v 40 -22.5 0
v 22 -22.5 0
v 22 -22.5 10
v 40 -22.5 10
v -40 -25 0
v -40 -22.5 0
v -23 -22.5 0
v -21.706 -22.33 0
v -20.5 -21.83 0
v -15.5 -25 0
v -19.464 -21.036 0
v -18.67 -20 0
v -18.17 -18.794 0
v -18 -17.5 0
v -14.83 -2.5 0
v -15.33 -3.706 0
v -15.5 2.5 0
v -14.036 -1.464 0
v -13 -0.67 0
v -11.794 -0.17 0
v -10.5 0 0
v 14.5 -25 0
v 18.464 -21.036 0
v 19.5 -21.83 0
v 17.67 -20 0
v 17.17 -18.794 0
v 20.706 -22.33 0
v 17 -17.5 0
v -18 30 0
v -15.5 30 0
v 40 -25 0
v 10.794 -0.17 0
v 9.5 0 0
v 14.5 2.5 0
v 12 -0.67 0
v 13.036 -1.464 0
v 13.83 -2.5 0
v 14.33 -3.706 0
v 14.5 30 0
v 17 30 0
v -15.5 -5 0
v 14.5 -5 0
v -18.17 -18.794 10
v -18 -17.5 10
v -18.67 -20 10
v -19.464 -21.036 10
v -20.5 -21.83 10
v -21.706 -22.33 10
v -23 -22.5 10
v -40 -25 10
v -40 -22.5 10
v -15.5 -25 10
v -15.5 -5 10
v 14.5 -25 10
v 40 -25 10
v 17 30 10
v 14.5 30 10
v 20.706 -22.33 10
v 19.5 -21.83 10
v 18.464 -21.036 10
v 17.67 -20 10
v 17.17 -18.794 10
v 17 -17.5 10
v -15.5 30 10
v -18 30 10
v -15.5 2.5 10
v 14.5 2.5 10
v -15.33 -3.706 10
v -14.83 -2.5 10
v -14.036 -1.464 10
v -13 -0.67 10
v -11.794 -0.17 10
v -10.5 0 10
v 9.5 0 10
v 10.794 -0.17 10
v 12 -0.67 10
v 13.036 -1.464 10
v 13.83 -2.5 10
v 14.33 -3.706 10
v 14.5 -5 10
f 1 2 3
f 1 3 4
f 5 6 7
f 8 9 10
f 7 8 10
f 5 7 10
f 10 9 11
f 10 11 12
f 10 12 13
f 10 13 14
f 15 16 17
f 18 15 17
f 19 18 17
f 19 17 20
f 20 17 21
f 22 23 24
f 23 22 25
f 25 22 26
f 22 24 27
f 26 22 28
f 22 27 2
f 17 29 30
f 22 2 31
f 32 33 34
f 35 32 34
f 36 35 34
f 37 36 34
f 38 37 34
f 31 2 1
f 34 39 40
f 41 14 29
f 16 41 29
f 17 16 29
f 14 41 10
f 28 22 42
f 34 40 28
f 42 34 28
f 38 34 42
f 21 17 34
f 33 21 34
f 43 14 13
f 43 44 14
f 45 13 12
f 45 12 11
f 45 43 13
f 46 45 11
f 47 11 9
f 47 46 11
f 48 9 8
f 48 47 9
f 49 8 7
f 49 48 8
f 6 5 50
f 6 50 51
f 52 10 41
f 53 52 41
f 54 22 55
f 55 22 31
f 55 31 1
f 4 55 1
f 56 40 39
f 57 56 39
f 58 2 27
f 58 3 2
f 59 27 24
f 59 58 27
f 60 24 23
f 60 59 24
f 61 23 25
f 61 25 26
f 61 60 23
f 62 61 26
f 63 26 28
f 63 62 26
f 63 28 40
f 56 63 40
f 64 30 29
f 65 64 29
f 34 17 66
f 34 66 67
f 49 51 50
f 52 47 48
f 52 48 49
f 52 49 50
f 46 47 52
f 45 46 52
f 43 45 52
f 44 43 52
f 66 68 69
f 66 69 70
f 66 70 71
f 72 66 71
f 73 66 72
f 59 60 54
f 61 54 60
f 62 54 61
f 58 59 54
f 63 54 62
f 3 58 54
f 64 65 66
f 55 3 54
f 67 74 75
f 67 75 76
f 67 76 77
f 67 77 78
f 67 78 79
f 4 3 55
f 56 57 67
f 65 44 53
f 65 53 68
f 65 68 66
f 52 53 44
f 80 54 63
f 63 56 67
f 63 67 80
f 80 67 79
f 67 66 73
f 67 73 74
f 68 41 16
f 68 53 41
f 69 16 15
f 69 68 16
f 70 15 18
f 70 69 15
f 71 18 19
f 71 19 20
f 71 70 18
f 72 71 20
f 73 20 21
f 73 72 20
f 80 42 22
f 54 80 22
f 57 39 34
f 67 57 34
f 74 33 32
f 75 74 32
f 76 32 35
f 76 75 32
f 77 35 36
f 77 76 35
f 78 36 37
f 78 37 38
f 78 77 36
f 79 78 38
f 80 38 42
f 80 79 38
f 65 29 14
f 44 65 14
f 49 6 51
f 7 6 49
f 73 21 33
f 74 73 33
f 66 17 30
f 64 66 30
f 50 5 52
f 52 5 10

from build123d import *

# Parameters (mm, degrees)
F0_W     = 22
F0_H     = 2.5
F0_W_2   = 30
F0_W_3   = 23
F0_W_4   = 2.5
F1_DEPTH = 10
F2_R     = 5


with BuildPart() as f1:
    # F0 (on Top) → F1 (new body)
    with BuildSketch(Plane.XY):
        Polygon((-15.5, 2.5), (-15.5, 30), (-18, 30), (-18, -22.5), (-15.5, -22.5), (-15.5, 0), align=None)
        with Locations((-29, -23.75)):
            Rectangle(F0_W, F0_H)
        with Locations((-0.5, 1.25)):
            Rectangle(F0_W_2, F0_H)
        Polygon((14.5, 30), (14.5, 2.5), (14.5, 0), (14.5, -22.5), (17, -22.5), (17, 30), align=None)
        with Locations((28.5, -23.75)):
            Rectangle(F0_W_3, F0_H)
        with Locations((15.75, -23.75)):
            Rectangle(F0_W_4, F0_H)
        with Locations((-16.75, -23.75)):
            Rectangle(F0_W_4, F0_H)
    extrude(amount=F1_DEPTH)

    # F2
    f2_edges = [f1.edges().sort_by_distance(p)[0] for p in [
        (-18, -22.5, 5),
        (17, -22.5, 5),
        (14.5, 0, 5),
        (-15.5, 0, 5),
    ]]
    fillet(f2_edges, radius=F2_R)


solid = f1.part
